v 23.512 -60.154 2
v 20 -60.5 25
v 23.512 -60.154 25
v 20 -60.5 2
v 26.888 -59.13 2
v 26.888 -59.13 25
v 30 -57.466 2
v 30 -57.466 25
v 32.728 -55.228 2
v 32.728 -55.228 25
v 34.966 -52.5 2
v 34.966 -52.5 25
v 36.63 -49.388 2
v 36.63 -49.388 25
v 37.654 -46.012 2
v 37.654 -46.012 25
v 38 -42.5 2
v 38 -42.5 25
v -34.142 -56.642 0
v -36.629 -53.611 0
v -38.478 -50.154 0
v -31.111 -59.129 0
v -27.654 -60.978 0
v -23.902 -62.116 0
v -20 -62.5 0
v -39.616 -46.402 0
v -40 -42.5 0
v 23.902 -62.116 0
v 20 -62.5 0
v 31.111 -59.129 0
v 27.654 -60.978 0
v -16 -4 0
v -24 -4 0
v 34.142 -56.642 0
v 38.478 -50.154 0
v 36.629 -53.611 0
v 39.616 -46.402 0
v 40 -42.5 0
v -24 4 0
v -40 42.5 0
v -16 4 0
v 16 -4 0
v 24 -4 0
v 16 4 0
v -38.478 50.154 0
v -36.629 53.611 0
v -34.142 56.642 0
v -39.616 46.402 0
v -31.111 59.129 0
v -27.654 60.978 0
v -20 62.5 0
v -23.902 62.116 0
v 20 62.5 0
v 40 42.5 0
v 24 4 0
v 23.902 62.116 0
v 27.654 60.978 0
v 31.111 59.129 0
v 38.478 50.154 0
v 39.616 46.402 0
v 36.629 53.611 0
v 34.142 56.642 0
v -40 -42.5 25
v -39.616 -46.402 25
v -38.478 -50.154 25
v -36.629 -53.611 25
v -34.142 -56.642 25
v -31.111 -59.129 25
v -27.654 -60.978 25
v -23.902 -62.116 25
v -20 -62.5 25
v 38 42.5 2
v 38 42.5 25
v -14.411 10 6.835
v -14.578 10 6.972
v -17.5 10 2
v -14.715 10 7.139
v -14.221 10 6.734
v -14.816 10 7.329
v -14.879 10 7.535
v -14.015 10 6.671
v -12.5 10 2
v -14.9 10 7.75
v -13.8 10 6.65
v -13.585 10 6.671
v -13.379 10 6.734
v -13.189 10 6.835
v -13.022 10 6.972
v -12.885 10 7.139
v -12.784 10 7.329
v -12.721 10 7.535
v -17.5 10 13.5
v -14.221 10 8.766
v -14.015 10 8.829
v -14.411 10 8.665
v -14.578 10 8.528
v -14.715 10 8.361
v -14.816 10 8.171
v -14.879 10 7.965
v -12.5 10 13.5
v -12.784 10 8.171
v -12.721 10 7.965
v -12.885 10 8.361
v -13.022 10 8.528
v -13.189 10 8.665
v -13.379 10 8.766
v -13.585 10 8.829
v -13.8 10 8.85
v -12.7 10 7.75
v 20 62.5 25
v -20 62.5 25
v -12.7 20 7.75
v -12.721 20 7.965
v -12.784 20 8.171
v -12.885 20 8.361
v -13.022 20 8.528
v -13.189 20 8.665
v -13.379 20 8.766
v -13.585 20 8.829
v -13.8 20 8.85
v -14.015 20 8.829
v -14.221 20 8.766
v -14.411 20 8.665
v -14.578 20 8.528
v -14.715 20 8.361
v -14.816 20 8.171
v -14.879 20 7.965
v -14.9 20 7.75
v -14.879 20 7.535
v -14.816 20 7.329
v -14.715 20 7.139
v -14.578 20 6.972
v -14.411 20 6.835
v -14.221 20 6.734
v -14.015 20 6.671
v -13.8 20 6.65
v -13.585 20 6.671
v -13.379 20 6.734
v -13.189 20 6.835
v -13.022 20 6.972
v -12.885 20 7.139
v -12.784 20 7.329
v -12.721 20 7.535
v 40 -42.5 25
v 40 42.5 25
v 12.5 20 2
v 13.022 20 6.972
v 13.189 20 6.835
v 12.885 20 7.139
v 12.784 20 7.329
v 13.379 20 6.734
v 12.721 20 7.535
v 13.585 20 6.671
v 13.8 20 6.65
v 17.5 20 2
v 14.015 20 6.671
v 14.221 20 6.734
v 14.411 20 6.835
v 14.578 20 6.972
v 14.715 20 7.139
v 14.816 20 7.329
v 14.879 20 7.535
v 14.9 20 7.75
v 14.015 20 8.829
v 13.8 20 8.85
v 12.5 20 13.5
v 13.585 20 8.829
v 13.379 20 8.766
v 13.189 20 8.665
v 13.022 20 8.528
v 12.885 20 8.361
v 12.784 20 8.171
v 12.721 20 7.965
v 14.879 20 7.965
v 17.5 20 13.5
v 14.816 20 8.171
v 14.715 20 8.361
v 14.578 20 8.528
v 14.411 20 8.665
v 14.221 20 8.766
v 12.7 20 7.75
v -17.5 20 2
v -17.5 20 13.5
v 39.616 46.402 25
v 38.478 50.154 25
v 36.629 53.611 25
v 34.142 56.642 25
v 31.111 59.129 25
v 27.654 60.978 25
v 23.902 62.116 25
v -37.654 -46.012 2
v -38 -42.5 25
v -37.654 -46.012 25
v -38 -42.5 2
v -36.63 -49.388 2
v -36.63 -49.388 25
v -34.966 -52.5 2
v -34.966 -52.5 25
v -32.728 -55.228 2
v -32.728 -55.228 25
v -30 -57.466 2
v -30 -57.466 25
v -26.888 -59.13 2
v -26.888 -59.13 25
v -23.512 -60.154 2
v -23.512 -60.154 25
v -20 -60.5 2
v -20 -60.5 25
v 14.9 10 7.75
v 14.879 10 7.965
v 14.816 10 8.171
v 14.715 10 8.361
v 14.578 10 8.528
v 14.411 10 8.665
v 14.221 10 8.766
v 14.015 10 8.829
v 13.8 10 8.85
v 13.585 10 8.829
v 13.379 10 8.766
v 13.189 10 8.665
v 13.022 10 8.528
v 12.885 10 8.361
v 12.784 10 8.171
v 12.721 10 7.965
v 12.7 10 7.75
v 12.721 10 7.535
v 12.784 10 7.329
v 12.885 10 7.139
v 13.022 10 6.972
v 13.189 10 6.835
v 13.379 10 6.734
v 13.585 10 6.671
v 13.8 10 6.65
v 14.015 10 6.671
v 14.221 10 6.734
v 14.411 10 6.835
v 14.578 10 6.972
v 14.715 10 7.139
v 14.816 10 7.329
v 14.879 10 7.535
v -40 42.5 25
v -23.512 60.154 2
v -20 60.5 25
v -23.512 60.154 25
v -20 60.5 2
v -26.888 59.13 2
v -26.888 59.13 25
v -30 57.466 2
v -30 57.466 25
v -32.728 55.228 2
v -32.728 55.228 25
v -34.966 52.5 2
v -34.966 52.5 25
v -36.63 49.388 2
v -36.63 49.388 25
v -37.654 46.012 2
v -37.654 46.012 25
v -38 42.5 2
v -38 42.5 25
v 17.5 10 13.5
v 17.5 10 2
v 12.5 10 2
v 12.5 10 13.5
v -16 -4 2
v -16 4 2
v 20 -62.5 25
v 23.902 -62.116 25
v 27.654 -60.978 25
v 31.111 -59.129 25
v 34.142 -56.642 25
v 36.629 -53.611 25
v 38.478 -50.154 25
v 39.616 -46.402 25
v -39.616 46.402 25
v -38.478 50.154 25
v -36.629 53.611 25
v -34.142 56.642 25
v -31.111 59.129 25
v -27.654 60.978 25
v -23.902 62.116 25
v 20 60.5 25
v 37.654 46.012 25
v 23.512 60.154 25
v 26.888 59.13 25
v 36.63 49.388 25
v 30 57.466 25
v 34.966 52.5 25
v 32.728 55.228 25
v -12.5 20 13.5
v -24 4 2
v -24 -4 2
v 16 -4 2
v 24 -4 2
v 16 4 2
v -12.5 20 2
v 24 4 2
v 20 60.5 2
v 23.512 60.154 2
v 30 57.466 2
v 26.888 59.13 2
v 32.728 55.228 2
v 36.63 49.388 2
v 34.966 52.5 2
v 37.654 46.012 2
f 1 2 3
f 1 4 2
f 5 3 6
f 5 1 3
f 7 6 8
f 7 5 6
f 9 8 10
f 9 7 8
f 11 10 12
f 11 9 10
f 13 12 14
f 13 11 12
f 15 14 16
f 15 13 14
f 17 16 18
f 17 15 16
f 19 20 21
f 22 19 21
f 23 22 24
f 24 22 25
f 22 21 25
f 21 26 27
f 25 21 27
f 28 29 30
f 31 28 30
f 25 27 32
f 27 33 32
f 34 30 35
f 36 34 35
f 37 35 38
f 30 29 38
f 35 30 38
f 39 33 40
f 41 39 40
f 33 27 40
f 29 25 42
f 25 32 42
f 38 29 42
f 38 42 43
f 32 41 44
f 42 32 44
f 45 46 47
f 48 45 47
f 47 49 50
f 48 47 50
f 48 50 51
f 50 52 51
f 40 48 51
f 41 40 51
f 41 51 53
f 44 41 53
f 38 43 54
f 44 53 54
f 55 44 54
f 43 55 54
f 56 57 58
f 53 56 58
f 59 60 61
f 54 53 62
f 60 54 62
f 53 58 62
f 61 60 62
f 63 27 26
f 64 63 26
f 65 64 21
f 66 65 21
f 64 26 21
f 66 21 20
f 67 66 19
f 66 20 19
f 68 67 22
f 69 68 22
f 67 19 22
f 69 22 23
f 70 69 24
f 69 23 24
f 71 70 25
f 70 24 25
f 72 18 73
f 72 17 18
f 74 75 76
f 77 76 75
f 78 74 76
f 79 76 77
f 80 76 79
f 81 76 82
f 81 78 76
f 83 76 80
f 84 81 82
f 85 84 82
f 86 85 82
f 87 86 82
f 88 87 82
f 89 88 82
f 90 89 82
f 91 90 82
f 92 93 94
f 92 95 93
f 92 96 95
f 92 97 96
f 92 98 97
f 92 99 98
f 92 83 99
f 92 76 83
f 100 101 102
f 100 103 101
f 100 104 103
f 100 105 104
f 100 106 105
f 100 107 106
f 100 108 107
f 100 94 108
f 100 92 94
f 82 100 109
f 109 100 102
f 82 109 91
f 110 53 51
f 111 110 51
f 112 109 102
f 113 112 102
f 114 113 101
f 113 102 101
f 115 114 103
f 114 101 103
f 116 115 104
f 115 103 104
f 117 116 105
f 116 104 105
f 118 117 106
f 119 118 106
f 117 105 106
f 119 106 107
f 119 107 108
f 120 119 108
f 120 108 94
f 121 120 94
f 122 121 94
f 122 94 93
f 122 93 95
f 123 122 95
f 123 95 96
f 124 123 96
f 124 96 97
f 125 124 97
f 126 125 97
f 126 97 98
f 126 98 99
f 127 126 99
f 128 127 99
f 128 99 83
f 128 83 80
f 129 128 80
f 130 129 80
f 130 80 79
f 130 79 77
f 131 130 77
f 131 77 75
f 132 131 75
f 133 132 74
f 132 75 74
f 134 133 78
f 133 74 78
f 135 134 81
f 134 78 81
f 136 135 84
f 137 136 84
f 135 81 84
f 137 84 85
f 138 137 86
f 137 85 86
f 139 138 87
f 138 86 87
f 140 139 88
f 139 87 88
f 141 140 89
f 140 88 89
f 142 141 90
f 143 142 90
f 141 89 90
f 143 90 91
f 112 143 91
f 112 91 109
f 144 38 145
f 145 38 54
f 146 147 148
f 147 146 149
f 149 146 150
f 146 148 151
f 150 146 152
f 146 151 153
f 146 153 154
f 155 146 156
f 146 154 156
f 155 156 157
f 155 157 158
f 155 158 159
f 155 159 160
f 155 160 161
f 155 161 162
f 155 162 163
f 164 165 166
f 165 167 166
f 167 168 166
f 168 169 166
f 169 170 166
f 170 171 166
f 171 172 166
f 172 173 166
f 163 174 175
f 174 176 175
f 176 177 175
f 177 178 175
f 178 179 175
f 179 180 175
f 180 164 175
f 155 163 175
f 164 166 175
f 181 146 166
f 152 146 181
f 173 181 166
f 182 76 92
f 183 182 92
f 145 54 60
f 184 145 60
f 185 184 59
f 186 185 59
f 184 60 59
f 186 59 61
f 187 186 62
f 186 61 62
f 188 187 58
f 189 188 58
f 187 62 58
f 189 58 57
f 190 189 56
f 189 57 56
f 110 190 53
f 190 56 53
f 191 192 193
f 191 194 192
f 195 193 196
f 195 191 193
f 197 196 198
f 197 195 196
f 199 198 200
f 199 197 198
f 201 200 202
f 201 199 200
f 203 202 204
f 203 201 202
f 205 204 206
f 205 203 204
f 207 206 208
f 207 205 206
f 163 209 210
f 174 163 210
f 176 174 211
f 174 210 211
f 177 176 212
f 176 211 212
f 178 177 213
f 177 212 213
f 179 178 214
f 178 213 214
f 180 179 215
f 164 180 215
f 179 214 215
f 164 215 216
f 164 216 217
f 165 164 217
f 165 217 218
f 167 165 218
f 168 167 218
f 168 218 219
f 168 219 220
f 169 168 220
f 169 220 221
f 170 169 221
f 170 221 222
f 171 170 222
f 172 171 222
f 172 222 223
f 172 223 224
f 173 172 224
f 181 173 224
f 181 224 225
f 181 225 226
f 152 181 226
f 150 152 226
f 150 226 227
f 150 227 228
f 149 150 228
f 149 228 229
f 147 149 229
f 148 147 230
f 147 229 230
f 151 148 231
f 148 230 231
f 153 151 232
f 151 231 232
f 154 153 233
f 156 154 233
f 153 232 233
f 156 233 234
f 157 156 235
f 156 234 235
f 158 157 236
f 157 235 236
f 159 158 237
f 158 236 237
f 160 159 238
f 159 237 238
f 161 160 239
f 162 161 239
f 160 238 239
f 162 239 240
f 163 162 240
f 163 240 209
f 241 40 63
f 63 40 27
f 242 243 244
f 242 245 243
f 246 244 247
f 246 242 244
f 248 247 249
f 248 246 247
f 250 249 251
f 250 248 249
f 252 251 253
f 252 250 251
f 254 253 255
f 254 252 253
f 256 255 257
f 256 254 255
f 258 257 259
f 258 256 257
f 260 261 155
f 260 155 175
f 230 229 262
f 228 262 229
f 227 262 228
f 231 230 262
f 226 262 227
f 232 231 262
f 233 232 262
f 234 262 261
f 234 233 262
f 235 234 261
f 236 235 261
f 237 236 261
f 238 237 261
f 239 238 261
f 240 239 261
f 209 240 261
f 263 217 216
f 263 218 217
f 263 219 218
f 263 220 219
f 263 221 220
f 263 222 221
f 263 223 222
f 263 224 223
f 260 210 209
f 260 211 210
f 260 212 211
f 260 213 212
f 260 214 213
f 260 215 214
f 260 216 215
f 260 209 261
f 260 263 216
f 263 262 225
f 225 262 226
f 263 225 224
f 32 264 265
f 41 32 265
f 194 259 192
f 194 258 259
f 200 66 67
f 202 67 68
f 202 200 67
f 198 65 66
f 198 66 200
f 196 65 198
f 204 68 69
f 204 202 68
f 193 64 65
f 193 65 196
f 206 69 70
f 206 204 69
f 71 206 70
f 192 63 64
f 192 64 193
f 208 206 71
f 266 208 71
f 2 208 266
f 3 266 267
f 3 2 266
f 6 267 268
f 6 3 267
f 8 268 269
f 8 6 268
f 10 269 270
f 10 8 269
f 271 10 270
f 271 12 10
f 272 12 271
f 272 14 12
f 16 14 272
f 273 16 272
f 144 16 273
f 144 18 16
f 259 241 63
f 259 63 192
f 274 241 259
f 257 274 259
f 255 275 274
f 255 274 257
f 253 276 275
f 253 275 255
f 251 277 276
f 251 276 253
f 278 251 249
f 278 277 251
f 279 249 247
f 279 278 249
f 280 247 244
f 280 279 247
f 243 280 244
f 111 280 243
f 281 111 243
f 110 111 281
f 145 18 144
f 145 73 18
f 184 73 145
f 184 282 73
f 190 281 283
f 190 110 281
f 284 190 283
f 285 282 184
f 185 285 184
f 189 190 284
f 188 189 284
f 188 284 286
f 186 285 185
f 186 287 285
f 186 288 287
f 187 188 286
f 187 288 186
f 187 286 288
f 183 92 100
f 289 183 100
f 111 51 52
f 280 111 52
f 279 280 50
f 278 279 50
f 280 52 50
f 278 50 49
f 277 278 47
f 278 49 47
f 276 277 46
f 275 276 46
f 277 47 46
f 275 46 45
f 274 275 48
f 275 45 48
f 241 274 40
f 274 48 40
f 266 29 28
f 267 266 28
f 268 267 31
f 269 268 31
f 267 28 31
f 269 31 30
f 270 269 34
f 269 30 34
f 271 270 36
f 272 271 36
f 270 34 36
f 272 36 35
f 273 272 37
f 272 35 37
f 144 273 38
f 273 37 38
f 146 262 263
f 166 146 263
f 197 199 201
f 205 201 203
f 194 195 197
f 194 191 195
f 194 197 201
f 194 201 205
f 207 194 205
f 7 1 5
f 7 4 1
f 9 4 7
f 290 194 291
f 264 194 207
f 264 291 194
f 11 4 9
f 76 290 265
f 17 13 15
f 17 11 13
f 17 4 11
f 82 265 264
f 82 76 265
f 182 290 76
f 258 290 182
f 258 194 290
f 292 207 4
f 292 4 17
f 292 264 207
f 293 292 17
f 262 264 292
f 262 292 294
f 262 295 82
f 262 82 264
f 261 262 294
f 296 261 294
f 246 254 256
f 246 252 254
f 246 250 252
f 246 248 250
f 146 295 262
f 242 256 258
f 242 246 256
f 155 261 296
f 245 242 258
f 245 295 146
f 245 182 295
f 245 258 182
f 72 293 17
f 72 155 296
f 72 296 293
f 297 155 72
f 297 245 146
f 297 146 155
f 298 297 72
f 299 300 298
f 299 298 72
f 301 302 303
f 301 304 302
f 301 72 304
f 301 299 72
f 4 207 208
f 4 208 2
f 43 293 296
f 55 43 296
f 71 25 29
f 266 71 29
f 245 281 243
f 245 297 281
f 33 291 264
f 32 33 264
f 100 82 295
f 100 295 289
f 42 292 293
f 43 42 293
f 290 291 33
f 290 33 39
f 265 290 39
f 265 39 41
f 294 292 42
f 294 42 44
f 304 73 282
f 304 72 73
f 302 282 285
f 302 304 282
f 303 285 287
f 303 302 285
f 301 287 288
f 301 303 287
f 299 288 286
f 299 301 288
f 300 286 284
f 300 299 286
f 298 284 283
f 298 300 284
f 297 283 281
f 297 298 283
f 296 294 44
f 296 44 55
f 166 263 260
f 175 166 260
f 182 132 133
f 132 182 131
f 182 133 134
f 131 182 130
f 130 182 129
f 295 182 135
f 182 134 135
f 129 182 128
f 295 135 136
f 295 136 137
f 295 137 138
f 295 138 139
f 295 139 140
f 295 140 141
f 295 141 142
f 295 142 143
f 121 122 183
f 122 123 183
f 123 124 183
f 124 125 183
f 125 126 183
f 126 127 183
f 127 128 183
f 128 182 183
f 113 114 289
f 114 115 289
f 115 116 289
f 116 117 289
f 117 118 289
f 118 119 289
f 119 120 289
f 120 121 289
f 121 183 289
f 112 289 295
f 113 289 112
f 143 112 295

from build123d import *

# Parameters (mm, degrees)
F1_DEPTH  = 2
F2_DEPTH  = 25
F3_T      = -2
F4_W      = 8
F4_H      = 8
F5_DEPTH  = 25
F6_W      = 35
F6_H      = 11.5
F6_R      = 1.1
F7_DEPTH  = 30
F8_DEPTH  = 10
F9_W      = 25
F9_H      = 11.5
F10_DEPTH = 25
F11_DEPTH = 10


# Not quite as in the source:
# - a feature names something its author has since deleted; it is built from what else it names


with BuildPart() as f1:
    # F0 (on Top) → F1 (new body)
    with BuildSketch(Plane.XY):
        with BuildLine():
            Line((-20, -62.5), (20, -62.5))
            ThreePointArc((20, -62.5), (34.1421356237, -56.6421356237), (40, -42.5))
            Line((40, -42.5), (40, 42.5))
            ThreePointArc((40, 42.5), (34.1421356237, 56.6421356237), (20, 62.5))
            Line((20, 62.5), (-20, 62.5))
            ThreePointArc((-20, 62.5), (-34.1421356237, 56.6421356237), (-40, 42.5))
            Line((-40, 42.5), (-40, -42.5))
            ThreePointArc((-40, -42.5), (-34.1421356237, -56.6421356237), (-20, -62.5))
        make_face()
    extrude(amount=F1_DEPTH)

    # F0 (on Top) → F2 (join)
    with BuildSketch(Plane.XY):
        with BuildLine():
            Line((-20, -62.5), (20, -62.5))
            ThreePointArc((20, -62.5), (34.1421356237, -56.6421356237), (40, -42.5))
            Line((40, -42.5), (40, 42.5))
            ThreePointArc((40, 42.5), (34.1421356237, 56.6421356237), (20, 62.5))
            Line((20, 62.5), (-20, 62.5))
            ThreePointArc((-20, 62.5), (-34.1421356237, 56.6421356237), (-40, 42.5))
            Line((-40, 42.5), (-40, -42.5))
            ThreePointArc((-40, -42.5), (-34.1421356237, -56.6421356237), (-20, -62.5))
        make_face()
    extrude(amount=F2_DEPTH)

    # F3
    f3_openings = [f1.faces().sort_by_distance(p)[0] for p in [
        (0, 0, 25),
    ]]
    offset(amount=F3_T, openings=f3_openings)

    # F4 (on face) → F5 (cut)
    with BuildSketch(Plane.XY.offset(2)):
        with Locations((20, 0)):
            Rectangle(F4_W, F4_H)
        with Locations((-20, 0)):
            Rectangle(F4_W, F4_H)
    extrude(amount=-F5_DEPTH, mode=Mode.SUBTRACT)

    # F6 (on Front) → F7 (join)
    with BuildSketch(Plane.XZ):
        with Locations((0, 7.75)):
            Rectangle(F6_W, F6_H)
        with Locations((-13.8, 7.75)):
            Circle(F6_R, mode=Mode.SUBTRACT)
        with Locations((13.8, 7.75)):
            Circle(F6_R, mode=Mode.SUBTRACT)
    extrude(amount=-F7_DEPTH)

    # F8 (cut): a face of the model
    f8_faces = [f1.faces().sort_by_distance(p)[0] for p in [
        (0, 0, 7.75),
    ]]
    extrude(f8_faces, amount=-F8_DEPTH, mode=Mode.SUBTRACT)

    # F9 (on face) → F10 (cut)
    with BuildSketch(Plane.XZ.offset(-10)):
        with Locations((0, 7.75)):
            Rectangle(F9_W, F9_H)
    extrude(amount=-F10_DEPTH, mode=Mode.SUBTRACT)

    # F11 (cut): faces of the model
    f11_faces = [f1.faces().sort_by_distance(p)[0] for p in [
        (15.0849479566, 30, 7.75),
        (-15.0849479566, 30, 7.75),
    ]]
    extrude(f11_faces, amount=-F11_DEPTH, mode=Mode.SUBTRACT)


solid = f1.part
